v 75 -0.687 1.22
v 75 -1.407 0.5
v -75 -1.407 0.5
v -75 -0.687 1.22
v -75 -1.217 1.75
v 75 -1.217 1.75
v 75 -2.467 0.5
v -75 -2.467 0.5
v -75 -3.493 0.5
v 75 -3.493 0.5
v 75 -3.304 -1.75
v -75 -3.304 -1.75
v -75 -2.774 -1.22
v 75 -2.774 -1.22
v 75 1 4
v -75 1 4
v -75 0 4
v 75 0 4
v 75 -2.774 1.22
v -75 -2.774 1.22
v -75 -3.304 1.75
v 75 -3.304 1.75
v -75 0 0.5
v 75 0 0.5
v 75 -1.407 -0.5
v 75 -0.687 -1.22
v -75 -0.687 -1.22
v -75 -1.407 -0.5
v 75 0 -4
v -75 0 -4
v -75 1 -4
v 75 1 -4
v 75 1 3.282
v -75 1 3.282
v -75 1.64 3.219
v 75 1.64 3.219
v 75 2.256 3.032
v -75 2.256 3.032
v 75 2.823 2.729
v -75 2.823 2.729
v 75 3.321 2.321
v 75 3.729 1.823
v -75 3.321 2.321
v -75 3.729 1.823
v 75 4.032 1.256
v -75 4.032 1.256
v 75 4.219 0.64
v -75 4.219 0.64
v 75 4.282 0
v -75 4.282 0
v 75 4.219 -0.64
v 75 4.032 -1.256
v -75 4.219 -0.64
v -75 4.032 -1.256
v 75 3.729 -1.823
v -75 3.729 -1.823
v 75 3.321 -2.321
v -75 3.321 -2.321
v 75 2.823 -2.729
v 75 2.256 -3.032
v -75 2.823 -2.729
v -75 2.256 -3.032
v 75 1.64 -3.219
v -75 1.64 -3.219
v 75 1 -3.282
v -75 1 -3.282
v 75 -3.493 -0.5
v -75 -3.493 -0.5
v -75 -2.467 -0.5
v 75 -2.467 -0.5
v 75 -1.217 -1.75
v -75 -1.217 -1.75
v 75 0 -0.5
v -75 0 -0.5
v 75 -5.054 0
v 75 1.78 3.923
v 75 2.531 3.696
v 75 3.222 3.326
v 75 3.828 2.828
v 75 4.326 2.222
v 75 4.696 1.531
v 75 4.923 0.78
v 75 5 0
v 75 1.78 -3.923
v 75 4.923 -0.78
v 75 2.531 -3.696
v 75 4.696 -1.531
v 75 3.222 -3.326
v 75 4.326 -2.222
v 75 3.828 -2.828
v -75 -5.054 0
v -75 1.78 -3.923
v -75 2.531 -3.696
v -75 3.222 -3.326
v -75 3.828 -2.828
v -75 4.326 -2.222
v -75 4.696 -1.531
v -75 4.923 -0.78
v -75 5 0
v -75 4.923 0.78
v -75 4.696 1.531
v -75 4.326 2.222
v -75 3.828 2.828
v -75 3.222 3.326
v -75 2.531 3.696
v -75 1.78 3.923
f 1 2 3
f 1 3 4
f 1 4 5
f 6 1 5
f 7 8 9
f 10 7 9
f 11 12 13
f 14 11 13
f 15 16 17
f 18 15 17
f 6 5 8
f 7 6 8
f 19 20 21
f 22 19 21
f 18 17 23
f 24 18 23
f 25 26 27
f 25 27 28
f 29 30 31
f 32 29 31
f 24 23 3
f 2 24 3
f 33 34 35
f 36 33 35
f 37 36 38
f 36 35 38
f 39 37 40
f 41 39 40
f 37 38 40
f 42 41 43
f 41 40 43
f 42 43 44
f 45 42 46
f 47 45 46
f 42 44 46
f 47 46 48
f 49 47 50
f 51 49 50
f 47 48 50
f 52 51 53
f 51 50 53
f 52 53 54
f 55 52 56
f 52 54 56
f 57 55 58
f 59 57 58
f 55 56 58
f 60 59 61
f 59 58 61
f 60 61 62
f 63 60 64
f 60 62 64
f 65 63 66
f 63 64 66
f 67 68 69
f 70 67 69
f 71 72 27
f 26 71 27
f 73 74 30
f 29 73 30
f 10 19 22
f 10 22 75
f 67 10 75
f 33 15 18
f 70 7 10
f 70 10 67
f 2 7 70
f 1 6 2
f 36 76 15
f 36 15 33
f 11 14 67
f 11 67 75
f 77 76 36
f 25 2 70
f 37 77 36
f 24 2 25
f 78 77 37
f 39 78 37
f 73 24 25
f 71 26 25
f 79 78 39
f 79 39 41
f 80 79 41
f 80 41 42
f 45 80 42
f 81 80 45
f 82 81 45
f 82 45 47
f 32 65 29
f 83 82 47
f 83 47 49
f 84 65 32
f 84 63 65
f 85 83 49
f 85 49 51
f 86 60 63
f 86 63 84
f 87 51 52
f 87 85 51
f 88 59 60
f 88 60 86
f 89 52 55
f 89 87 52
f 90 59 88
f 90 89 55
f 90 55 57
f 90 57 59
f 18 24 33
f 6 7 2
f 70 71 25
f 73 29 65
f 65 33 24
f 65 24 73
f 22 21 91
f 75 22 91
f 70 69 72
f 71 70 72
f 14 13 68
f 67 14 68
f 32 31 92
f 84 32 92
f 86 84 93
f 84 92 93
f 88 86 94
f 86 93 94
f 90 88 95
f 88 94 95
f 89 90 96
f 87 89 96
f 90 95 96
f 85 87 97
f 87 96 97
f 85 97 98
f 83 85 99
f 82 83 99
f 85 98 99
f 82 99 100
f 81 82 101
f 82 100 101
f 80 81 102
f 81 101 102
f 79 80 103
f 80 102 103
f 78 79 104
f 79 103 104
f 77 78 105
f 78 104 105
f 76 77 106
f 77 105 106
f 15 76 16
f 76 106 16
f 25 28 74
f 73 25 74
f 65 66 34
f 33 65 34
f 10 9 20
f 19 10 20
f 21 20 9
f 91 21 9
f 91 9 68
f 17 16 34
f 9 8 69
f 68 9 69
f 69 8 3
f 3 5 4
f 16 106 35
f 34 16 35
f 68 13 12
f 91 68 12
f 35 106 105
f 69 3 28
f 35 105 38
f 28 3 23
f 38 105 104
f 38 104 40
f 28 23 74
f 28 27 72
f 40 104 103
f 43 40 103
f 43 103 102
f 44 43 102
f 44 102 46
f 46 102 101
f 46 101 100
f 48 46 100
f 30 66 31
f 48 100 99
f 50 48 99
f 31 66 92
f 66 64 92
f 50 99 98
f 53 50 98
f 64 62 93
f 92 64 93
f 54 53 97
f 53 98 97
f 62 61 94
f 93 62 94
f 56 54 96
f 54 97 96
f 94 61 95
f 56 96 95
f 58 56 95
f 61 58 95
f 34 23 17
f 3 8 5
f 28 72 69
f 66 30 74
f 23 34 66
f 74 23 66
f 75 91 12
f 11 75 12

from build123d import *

# Parameters (mm, degrees)
EXTRUDE_2_DEPTH      = 75
EXTRUDE_2_DEPTH_BACK = 75


with BuildPart() as part:
    # 草图1<2> → 凸台-拉伸2 (new, two sides: drawn at the far end of the back side and taken through both)
    with BuildSketch(Plane(origin=(0, 0, 0), x_dir=(0, 0, -1), z_dir=(1, 0, 0)).offset(-EXTRUDE_2_DEPTH_BACK)):
        with BuildLine():
            Line((-4, 0), (-0.5, 0))
            Line((-0.5, 0), (-0.5, -1.406748669))
            Line((-0.5, -1.406748669), (-1.219669914, -0.687078754))
            Line((-1.219669914, -0.687078754), (-1.75, -1.21740884))
            Line((-1.75, -1.21740884), (-0.5, -2.46740884))
            Line((-0.5, -2.46740884), (-0.5, -3.49335212))
            Line((-0.5, -3.49335212), (-1.219669914, -2.773682206))
            Line((-1.219669914, -2.773682206), (-1.75, -3.304012292))
            Line((-1.75, -3.304012292), (0, -5.054012292))
            Line((0, -5.054012292), (1.75, -3.304012292))
            Line((1.75, -3.304012292), (1.219669914, -2.773682206))
            Line((1.219669914, -2.773682206), (0.5, -3.49335212))
            Line((0.5, -3.49335212), (0.5, -2.46740884))
            Line((0.5, -2.46740884), (1.75, -1.21740884))
            Line((1.75, -1.21740884), (1.219669914, -0.687078754))
            Line((1.219669914, -0.687078754), (0.5, -1.406748669))
            Line((0.5, -1.406748669), (0.5, 0))
            Line((0.5, 0), (4, 0))
            Line((4, 0), (4, 1))
            ThreePointArc((4, 1), (0, 5), (-4, 1))
            Line((-4, 1), (-4, 0))
        make_face()
        with BuildLine():
            Line((3.282029094, 1), (-3.282029094, 1))
            ThreePointArc((-3.282029094, 1), (0, 4.282029094), (3.282029094, 1))
        make_face(mode=Mode.SUBTRACT)
    extrude(amount=EXTRUDE_2_DEPTH + EXTRUDE_2_DEPTH_BACK)


solid = part.part
